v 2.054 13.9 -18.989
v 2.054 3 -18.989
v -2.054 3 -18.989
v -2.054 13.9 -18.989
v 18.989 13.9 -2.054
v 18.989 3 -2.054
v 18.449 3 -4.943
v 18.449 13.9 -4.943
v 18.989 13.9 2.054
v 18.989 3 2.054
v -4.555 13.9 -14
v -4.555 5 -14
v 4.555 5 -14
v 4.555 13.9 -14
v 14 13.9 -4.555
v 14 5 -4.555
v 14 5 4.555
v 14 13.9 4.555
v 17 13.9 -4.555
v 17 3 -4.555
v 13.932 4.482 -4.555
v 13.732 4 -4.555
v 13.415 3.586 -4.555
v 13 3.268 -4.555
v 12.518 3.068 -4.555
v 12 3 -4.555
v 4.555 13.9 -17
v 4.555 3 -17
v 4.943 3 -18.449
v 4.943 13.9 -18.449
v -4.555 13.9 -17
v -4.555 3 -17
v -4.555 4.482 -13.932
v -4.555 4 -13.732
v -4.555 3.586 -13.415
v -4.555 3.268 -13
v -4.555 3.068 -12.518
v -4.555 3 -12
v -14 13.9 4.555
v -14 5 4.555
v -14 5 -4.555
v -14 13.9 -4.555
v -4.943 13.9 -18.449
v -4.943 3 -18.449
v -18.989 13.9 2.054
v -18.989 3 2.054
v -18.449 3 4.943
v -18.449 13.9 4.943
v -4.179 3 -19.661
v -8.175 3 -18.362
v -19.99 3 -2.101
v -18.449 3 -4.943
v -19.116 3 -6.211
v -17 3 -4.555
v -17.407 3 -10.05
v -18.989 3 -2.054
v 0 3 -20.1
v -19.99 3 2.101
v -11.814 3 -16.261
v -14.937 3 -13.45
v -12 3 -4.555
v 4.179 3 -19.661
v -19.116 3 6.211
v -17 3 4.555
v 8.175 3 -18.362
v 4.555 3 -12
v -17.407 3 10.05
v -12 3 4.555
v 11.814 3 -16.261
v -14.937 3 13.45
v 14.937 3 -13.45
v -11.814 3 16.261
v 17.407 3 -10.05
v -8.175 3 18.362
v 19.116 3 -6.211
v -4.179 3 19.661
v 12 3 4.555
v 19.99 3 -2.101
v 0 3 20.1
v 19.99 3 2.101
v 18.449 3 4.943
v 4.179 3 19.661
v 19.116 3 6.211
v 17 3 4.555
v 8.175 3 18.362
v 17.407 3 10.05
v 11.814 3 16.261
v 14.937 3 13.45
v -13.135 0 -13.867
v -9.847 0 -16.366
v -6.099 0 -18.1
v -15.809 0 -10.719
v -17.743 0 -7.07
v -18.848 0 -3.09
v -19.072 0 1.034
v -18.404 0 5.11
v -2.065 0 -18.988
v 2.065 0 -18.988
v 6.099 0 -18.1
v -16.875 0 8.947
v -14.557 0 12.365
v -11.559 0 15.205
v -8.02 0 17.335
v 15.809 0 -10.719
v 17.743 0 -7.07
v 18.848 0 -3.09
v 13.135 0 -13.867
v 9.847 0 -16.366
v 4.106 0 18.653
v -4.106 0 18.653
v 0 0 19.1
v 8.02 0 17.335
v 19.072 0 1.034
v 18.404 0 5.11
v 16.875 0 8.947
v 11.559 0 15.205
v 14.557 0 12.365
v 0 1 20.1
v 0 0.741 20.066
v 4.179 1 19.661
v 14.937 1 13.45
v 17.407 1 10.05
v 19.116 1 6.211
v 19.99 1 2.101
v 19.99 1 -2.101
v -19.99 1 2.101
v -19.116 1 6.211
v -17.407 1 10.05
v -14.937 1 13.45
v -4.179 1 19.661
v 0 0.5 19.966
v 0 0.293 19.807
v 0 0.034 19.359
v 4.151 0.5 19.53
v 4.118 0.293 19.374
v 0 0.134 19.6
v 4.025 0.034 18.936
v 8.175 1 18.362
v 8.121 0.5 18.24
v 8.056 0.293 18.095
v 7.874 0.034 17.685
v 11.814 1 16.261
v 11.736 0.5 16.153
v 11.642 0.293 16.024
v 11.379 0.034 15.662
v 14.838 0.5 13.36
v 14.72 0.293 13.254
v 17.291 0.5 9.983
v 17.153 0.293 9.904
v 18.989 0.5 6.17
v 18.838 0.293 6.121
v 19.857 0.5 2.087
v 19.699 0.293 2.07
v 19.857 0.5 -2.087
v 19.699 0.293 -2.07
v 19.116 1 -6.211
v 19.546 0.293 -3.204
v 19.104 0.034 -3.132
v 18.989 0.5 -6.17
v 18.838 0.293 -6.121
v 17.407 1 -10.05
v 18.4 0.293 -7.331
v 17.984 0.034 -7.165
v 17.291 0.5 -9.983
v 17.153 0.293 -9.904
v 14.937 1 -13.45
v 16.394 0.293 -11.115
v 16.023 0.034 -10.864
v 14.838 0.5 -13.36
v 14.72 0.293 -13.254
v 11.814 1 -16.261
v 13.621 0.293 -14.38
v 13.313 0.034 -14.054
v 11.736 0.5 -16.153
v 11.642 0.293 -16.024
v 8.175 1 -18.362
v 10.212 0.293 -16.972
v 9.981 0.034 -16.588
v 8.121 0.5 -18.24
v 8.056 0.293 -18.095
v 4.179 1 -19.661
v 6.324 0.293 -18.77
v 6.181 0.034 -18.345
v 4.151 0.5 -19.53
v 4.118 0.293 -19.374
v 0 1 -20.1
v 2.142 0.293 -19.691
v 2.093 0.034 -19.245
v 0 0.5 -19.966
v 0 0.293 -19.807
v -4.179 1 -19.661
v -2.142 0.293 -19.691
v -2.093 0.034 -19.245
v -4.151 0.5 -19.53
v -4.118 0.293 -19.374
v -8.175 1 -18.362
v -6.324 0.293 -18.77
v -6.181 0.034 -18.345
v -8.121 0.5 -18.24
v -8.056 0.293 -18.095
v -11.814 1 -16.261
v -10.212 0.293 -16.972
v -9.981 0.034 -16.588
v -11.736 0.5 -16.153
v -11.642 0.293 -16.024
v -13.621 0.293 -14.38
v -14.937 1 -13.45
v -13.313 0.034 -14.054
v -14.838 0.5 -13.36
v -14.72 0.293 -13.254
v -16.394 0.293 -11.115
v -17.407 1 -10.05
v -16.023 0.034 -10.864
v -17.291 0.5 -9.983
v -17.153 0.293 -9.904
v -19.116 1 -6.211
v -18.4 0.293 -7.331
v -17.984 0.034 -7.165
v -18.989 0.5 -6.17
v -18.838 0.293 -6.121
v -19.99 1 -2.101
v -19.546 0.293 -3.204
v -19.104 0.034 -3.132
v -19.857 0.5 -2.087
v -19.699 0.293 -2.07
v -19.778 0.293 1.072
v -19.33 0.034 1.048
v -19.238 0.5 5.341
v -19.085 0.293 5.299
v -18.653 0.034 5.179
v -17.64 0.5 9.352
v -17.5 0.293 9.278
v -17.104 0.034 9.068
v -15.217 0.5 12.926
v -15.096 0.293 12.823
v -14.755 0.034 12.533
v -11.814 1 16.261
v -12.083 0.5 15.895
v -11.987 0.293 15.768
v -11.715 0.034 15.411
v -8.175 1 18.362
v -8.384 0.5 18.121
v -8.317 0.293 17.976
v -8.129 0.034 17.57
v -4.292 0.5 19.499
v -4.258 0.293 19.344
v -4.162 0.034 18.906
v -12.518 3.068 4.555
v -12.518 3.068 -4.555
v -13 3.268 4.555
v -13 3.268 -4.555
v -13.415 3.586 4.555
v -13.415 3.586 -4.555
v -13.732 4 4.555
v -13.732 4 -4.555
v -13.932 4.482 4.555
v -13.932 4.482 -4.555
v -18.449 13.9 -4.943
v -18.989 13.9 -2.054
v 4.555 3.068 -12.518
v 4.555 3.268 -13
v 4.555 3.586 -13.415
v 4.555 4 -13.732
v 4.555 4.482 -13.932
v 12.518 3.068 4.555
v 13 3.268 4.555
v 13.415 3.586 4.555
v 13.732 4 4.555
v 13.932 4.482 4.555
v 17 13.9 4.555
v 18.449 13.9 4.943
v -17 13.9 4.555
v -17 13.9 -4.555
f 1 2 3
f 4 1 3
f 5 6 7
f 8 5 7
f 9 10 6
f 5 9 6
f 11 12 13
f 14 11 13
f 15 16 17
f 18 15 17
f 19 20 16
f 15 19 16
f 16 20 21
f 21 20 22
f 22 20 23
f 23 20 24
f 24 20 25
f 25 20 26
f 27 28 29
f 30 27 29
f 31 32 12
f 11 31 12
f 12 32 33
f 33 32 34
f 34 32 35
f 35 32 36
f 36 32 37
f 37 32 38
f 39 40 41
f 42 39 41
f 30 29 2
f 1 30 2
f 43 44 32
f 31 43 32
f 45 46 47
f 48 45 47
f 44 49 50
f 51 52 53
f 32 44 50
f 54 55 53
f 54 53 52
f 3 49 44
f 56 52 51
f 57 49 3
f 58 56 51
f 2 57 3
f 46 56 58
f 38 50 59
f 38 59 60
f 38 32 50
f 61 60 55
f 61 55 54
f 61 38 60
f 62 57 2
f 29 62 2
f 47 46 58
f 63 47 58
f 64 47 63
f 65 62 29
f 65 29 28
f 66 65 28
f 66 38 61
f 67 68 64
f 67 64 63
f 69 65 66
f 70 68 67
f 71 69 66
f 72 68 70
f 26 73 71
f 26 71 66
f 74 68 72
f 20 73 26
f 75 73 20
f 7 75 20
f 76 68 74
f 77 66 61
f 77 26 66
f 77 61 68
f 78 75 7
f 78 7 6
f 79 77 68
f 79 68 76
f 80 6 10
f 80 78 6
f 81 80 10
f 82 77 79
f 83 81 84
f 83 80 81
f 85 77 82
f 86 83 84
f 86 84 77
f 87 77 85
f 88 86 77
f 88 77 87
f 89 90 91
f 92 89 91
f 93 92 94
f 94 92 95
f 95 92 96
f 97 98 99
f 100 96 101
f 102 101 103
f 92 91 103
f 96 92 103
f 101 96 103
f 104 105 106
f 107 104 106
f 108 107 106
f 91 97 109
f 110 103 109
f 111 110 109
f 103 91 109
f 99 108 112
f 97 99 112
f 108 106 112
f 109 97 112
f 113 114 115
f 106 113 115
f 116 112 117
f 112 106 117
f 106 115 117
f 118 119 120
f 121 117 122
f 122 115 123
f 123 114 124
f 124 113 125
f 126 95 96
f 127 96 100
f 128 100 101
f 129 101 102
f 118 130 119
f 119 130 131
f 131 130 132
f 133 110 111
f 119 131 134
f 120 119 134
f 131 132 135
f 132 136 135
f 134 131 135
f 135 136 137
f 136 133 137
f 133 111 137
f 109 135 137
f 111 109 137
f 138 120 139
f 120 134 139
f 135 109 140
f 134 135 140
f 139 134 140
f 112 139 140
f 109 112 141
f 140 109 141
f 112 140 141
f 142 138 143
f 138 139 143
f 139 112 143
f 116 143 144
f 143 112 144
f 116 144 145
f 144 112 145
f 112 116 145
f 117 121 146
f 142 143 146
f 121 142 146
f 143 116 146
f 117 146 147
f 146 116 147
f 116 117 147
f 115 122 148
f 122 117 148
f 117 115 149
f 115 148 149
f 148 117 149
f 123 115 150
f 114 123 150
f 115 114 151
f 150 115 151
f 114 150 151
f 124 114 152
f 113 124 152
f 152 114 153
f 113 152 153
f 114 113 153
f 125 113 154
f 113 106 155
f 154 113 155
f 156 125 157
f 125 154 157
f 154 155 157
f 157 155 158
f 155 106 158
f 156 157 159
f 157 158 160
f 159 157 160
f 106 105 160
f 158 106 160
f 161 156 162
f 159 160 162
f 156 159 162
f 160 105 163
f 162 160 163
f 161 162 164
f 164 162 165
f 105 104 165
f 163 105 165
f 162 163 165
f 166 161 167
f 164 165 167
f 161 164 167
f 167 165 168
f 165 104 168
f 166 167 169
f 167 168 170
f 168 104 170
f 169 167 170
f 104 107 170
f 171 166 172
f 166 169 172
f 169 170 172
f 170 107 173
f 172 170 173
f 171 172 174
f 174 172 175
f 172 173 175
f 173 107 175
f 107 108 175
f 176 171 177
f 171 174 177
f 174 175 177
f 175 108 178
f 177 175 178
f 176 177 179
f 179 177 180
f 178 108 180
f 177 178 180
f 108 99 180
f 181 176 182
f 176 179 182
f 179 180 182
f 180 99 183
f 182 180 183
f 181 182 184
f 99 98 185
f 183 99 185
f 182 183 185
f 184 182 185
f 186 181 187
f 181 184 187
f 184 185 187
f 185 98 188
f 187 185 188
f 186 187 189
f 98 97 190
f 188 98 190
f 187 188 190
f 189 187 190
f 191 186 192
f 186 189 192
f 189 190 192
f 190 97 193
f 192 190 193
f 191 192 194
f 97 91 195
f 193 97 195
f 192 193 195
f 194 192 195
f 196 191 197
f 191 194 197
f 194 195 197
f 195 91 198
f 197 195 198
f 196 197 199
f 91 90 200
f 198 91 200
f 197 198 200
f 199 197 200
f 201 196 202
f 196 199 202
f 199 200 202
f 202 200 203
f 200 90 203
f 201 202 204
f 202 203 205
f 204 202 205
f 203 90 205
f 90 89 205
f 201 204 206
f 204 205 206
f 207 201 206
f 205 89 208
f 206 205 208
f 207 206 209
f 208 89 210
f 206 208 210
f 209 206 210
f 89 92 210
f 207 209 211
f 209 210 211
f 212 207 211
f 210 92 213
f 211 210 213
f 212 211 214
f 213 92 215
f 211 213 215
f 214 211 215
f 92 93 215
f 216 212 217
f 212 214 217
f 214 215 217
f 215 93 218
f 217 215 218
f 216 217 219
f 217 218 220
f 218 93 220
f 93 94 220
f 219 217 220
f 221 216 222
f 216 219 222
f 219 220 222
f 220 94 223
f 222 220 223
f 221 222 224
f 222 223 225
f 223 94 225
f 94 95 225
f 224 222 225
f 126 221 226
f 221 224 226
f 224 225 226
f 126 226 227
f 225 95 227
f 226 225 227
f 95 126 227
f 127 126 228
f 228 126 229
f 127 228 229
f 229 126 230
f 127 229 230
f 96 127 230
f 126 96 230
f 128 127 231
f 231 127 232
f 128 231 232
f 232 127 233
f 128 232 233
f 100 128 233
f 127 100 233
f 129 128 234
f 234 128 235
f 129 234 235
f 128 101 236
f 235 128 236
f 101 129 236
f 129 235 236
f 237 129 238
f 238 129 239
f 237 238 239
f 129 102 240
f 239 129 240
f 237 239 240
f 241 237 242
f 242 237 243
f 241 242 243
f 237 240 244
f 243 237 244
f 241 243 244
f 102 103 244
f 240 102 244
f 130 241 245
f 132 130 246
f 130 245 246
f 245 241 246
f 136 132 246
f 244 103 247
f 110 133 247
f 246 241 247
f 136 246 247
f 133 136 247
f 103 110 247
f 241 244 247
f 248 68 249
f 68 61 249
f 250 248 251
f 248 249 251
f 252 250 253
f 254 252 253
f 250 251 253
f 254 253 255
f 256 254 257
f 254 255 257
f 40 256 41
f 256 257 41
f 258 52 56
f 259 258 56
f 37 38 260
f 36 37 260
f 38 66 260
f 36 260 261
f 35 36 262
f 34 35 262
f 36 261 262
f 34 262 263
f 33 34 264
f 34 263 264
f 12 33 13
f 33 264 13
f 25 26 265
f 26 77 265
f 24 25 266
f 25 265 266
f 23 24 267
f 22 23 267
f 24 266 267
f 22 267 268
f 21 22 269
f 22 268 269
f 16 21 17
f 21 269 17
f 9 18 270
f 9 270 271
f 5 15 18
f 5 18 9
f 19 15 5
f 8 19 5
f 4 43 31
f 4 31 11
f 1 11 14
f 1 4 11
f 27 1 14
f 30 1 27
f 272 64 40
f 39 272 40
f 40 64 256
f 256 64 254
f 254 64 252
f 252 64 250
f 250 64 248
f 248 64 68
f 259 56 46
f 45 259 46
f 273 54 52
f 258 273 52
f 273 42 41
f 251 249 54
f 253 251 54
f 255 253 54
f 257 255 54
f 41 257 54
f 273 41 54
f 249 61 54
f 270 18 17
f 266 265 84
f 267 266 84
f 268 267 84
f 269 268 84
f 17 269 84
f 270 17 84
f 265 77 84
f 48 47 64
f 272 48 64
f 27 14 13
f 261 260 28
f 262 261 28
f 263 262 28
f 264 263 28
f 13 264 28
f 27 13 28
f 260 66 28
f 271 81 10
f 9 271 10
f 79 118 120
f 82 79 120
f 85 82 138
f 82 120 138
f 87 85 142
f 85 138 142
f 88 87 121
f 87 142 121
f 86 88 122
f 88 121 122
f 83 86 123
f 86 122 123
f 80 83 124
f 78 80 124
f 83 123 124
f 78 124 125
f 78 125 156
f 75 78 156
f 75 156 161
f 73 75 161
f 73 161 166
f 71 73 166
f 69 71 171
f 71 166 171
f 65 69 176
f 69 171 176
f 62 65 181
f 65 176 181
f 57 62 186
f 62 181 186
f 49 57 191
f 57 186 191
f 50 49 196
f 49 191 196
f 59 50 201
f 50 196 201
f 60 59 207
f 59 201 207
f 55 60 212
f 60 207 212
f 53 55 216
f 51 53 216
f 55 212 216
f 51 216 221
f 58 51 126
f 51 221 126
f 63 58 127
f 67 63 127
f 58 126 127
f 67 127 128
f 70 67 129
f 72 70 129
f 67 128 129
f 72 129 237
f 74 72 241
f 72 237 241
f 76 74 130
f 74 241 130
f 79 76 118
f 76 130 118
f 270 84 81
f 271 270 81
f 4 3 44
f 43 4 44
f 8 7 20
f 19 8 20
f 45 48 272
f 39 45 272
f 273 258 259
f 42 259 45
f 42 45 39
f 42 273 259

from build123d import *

# Parameters (mm, degrees)
SKETCH2_R           = 20.1
BOSS_EXTRUDE2_DEPTH = 3
BOSS_EXTRUDE4_DEPTH = 10.9
FILLET1_R           = 2
FILLET2_R           = 1


with BuildPart() as part:
    # Sketch2 → Boss-Extrude2 (new body)
    with BuildSketch(Plane(origin=(0, 0, 0), x_dir=(1, 0, 0), z_dir=(0, 1, 0))):
        with Locations(Location((0, 0, 0), (0, 0, 270))):
            Circle(SKETCH2_R)
    extrude(amount=BOSS_EXTRUDE2_DEPTH)

    # Sketch3 → Boss-Extrude4 (add)
    with BuildSketch(Plane(origin=(0, 3, 0), x_dir=(1, 0, 0), z_dir=(0, 1, 0))):
        Polygon((-4.943443761, 18.449183282), (-4.555215194, 17.000294543), (-4.555215194, 14.000294543), (4.555215194, 14.000294543), (4.555215194, 17.000294543), (4.943443761, 18.449183282), (2.054487352, 18.989183282), (-2.054487352, 18.989183282), align=None)
        Polygon((17.000294543, 4.555215194), (14.000294543, 4.555215194), (14.000294543, -4.555215194), (17.000294543, -4.555215194), (18.449183282, -4.943443761), (18.989183282, -2.054487352), (18.989183282, 2.054487352), (18.449183282, 4.943443761), align=None)
        Polygon((-17.000294543, -4.555215194), (-14.000294543, -4.555215194), (-14.000294543, 4.555215194), (-17.000294543, 4.555215194), (-18.449183282, 4.943443761), (-18.989183282, 2.054487352), (-18.989183282, -2.054487352), (-18.449183282, -4.943443761), align=None)
    extrude(amount=BOSS_EXTRUDE4_DEPTH)

    # Fillet1
    fillet1_edges = [part.edges().sort_by_distance(p)[0] for p in [
        (-14.000294543, 3, 0),
        (14.000294543, 3, 0),
        (0, 3, -14.000294543),
    ]]
    fillet(fillet1_edges, radius=FILLET1_R)

    # Fillet2
    fillet2_edges = [part.edges().sort_by_distance(p)[0] for p in [
        (0, 0, -20.1),
    ]]
    fillet(fillet2_edges, radius=FILLET2_R)


solid = part.part
